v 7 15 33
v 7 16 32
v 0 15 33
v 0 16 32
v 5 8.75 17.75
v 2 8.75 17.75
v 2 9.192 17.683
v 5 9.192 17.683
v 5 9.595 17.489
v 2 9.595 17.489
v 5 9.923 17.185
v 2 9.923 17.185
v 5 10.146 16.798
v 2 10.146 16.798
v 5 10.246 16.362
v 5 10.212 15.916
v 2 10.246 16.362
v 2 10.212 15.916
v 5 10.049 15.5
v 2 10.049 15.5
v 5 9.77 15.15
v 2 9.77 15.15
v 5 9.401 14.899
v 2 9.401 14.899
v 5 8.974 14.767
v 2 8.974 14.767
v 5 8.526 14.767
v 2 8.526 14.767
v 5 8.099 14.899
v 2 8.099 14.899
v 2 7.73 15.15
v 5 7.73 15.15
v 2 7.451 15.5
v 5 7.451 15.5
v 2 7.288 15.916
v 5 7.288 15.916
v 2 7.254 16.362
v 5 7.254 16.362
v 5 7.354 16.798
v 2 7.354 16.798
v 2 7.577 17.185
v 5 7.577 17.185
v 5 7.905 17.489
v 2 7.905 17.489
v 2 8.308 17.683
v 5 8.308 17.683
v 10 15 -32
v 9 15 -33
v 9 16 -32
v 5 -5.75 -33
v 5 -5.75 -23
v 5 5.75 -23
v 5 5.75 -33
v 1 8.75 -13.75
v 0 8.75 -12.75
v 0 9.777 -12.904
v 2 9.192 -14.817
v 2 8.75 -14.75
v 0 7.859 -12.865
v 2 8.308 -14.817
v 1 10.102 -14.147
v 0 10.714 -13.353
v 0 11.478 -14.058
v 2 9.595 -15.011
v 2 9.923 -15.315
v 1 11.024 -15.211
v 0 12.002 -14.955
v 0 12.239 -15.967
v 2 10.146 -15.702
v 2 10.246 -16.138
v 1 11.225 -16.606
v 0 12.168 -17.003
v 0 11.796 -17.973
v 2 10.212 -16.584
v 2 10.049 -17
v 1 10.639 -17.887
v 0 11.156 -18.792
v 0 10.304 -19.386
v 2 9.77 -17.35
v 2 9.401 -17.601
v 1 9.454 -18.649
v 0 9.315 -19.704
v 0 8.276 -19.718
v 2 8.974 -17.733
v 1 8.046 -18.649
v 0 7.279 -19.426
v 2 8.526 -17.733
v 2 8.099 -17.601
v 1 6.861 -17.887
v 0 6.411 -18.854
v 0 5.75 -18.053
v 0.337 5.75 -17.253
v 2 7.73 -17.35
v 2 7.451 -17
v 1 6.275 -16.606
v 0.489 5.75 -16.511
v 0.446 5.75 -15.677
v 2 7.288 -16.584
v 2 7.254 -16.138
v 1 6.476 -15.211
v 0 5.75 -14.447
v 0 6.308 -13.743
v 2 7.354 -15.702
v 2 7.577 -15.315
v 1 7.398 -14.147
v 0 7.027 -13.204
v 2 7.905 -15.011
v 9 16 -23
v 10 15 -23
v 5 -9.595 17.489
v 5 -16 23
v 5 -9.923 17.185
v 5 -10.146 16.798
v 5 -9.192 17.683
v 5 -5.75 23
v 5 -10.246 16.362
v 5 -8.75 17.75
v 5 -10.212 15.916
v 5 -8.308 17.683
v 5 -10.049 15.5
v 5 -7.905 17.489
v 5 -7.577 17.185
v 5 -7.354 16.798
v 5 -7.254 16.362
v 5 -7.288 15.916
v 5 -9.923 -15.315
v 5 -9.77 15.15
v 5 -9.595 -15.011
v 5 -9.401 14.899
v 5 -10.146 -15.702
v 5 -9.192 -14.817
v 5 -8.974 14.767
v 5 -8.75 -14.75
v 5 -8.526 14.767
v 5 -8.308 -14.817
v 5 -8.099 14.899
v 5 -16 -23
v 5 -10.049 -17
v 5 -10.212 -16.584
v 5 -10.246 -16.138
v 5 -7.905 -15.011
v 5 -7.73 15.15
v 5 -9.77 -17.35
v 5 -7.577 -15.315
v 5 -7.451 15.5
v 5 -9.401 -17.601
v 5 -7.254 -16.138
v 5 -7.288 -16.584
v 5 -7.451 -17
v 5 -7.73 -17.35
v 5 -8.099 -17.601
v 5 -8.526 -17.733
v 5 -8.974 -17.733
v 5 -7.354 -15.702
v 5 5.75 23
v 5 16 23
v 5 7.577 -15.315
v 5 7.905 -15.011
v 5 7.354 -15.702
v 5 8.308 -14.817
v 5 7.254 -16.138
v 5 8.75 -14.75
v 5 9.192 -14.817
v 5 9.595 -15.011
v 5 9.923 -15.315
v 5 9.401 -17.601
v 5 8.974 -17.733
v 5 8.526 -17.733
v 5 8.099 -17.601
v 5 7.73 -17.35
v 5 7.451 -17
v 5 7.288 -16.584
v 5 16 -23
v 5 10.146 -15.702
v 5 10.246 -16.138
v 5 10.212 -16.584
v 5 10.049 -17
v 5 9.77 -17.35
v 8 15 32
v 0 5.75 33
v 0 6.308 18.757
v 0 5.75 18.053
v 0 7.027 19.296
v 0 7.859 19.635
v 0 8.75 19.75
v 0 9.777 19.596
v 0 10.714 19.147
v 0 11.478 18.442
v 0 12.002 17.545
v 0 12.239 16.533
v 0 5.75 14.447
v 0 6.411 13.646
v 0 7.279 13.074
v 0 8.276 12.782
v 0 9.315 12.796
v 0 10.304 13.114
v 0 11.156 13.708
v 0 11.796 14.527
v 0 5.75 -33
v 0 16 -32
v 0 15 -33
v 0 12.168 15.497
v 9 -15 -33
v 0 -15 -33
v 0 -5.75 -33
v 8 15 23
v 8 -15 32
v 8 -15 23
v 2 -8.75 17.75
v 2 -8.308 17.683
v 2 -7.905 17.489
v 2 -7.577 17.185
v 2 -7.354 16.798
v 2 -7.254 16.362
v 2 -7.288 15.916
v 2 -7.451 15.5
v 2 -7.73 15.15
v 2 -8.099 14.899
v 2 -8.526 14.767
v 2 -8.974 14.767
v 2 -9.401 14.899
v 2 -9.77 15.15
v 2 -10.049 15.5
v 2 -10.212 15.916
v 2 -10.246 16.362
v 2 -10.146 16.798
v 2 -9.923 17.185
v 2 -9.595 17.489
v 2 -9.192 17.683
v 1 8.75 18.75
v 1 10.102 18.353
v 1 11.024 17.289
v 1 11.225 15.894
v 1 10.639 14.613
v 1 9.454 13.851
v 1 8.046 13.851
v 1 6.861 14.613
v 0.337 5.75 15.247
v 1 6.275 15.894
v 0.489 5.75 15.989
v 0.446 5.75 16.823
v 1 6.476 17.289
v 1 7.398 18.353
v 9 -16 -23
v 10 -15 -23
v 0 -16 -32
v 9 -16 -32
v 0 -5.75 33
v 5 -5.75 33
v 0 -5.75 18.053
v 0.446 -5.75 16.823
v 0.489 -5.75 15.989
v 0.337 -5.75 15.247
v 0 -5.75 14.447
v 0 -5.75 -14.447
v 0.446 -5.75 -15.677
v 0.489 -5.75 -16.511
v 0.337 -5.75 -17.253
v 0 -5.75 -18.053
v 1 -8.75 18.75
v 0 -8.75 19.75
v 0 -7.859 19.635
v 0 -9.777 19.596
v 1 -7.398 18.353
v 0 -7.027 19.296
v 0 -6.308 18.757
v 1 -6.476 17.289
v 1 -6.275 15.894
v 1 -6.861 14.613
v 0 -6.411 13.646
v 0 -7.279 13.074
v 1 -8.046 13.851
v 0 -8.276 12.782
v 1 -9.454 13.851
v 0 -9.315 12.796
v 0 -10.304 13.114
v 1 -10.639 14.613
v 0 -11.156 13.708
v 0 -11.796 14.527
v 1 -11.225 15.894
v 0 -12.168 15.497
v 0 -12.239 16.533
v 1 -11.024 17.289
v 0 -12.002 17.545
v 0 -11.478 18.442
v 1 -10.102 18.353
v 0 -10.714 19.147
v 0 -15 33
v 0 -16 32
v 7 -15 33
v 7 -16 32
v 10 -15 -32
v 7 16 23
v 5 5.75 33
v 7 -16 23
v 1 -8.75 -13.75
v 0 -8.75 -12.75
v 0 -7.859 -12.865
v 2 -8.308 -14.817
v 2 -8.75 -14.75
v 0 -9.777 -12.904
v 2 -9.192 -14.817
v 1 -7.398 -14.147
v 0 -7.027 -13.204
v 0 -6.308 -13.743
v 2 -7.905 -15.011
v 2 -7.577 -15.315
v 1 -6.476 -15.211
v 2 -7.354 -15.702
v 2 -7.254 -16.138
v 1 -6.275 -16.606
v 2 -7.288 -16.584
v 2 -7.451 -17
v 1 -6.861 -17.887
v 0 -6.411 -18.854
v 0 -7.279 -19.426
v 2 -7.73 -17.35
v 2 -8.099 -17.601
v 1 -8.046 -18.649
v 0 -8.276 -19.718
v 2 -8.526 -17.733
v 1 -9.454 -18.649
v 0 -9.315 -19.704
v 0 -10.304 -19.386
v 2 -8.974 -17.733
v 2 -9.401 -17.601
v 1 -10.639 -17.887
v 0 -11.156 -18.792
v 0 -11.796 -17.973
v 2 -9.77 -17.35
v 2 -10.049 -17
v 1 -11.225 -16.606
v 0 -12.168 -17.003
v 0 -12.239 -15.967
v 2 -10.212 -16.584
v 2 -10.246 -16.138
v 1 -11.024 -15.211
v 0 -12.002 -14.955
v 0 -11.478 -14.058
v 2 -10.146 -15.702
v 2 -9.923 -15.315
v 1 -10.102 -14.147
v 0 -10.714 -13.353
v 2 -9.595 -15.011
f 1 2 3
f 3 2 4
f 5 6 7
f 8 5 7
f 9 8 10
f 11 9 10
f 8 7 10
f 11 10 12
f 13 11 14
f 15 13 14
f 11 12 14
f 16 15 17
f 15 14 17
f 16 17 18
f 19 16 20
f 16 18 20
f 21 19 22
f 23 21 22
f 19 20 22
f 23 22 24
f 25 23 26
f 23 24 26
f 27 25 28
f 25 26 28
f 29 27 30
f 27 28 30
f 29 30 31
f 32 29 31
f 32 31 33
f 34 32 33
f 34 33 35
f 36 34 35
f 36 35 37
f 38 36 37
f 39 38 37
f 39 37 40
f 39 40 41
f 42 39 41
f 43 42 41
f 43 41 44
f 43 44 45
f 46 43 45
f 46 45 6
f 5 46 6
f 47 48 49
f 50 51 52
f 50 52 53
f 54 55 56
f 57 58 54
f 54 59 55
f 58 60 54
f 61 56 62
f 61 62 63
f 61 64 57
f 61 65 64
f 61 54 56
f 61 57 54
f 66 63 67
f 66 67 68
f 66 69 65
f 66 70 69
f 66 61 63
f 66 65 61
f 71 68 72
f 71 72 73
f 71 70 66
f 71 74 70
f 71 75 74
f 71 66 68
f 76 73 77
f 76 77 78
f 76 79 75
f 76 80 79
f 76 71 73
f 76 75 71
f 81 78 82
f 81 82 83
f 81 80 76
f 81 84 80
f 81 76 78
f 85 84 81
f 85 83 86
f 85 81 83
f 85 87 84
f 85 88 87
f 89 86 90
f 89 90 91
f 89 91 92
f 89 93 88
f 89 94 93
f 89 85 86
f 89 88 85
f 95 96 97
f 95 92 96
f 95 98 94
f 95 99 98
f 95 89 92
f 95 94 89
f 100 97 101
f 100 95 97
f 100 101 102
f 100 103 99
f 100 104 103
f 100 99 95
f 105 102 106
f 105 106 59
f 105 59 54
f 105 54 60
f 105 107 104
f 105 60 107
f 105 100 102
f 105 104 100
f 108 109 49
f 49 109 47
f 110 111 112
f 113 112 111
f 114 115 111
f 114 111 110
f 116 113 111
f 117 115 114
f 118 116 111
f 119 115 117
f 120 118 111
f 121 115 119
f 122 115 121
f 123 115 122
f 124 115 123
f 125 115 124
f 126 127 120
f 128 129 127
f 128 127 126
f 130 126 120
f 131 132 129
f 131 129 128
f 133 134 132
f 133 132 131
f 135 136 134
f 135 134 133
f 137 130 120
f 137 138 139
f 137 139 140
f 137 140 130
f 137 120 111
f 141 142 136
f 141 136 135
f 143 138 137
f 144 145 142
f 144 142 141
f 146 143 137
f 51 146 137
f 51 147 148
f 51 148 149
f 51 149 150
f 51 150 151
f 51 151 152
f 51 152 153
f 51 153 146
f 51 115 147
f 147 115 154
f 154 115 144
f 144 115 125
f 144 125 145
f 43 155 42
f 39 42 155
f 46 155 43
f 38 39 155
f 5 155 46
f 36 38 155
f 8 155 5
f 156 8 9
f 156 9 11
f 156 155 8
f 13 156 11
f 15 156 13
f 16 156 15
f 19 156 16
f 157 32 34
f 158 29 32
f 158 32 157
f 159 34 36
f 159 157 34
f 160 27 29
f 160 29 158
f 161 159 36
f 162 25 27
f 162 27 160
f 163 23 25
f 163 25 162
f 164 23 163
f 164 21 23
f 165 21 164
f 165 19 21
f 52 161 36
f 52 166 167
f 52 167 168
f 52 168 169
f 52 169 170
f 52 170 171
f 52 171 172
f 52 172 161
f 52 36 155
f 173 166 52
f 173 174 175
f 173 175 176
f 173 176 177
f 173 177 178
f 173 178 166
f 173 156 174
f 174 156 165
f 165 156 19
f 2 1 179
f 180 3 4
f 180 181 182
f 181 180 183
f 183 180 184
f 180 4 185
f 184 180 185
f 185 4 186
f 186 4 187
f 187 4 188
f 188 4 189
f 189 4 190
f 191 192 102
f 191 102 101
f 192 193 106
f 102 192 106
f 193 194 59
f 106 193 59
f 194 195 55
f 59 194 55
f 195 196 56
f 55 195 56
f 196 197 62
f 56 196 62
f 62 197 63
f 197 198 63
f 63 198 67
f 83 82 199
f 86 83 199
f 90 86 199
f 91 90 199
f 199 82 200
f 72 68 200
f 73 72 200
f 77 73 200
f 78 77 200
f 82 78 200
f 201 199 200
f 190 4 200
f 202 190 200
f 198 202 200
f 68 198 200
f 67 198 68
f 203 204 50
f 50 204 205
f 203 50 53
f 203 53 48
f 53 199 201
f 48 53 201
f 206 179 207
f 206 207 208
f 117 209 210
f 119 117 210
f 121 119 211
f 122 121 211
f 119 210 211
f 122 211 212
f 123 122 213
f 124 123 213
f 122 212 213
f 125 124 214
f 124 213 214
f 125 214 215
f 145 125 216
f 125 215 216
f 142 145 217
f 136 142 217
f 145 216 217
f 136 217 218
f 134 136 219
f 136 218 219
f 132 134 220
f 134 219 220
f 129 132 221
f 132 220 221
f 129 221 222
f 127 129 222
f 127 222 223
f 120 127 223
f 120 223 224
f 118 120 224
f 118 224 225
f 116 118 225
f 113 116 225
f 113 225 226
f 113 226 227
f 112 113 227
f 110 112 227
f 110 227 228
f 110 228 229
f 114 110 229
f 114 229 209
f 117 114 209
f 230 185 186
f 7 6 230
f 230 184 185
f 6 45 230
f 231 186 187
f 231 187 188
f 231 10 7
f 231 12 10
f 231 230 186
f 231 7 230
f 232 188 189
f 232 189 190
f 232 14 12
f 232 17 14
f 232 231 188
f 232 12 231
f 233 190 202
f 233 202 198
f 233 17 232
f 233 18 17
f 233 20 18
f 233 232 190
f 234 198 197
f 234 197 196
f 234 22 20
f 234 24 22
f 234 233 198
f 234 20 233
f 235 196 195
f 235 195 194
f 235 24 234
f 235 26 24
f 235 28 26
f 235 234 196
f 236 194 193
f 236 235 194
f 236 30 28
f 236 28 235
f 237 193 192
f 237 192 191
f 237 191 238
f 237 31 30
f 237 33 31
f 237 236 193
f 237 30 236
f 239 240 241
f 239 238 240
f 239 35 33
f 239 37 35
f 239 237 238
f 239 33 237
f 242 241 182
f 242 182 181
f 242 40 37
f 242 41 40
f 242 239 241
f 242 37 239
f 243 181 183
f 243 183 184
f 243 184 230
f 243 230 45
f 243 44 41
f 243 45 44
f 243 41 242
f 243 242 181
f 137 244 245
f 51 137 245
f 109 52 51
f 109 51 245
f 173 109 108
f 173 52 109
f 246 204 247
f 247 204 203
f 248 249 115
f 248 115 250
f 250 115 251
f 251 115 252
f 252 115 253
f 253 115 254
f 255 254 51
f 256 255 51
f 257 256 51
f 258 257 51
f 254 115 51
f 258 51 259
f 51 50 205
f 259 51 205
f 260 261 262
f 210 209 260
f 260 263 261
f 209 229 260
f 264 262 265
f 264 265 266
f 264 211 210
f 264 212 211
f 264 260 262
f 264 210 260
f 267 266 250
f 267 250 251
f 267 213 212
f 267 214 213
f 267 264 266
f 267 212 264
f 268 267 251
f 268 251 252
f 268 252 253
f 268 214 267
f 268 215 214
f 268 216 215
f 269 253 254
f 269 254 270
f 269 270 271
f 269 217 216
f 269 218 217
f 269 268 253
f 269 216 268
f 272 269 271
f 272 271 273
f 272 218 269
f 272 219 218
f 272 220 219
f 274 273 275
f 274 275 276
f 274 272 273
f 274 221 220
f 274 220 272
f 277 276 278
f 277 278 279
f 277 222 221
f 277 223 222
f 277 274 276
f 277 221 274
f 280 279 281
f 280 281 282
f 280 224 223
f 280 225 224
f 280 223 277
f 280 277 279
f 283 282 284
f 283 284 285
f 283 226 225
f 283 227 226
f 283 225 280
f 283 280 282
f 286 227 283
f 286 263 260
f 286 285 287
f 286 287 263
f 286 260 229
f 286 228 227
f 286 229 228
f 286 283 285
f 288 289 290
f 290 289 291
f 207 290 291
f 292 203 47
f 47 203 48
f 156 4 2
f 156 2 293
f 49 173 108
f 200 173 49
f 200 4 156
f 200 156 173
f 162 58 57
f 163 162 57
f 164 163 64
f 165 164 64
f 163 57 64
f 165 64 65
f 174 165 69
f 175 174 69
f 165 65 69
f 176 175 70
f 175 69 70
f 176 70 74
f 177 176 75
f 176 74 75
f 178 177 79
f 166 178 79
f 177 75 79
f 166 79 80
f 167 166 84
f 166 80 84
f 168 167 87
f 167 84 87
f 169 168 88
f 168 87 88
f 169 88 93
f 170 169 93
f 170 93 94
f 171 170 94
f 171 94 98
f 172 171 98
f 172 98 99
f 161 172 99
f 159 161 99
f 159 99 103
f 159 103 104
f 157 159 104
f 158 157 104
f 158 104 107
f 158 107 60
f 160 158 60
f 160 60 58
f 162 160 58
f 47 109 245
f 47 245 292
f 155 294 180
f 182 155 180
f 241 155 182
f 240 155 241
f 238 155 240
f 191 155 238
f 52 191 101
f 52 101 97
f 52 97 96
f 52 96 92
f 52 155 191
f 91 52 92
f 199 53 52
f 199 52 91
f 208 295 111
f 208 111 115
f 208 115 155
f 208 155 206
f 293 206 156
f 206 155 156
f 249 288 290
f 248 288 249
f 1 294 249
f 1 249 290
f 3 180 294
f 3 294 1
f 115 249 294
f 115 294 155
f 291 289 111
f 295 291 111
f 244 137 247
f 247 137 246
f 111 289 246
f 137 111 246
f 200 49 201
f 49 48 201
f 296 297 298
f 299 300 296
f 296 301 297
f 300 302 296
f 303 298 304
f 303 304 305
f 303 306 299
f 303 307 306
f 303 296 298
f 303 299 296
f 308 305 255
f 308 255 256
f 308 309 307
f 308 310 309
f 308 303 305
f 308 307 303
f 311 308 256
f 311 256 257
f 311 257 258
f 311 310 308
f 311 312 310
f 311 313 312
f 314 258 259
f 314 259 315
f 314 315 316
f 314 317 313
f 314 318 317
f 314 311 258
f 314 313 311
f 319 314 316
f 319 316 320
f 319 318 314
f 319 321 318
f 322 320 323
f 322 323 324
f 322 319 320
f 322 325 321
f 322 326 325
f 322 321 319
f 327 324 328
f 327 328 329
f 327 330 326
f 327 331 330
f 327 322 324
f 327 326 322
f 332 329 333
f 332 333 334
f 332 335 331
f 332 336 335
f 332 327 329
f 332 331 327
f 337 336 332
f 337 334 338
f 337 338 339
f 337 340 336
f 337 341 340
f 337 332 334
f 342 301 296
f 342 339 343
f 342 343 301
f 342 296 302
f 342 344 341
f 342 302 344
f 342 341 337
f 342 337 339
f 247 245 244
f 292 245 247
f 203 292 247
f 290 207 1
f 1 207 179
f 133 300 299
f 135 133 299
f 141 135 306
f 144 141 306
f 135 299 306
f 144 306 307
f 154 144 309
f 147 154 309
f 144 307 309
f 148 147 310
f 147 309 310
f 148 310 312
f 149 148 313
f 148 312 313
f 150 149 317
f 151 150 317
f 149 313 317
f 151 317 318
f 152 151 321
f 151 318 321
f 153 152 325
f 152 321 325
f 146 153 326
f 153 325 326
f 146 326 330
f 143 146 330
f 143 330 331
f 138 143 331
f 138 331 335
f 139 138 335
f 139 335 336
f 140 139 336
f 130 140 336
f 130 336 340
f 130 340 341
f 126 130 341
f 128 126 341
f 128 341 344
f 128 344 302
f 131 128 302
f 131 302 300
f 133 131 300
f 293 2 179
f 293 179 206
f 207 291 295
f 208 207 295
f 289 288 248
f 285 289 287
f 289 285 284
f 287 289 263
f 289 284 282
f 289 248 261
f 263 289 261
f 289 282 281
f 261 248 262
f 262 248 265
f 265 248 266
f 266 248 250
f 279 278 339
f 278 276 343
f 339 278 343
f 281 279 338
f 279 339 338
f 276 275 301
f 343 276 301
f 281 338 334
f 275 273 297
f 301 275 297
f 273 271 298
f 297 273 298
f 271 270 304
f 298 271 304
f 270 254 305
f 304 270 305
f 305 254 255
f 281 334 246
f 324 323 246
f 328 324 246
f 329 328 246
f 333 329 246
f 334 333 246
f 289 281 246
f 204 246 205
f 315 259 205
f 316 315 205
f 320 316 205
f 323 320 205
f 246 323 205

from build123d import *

# Parameters (mm, degrees)
SKETCH_2_W          = 66
SKETCH_2_H          = 32
EXTRUDE_1_DEPTH     = 5
SKETCH_3_W          = 46
SKETCH_3_H          = 11.5
CUT_EXTRUDE_2_DEPTH = 38.013511047
SKETCH_4_W          = 5
SKETCH_4_H          = 11.5
CUT_EXTRUDE_3_DEPTH = 69.095521145
SKETCH_5_W          = 10
SKETCH_5_H          = 32
EXTRUDE_2_DEPTH     = 5
SKETCH_6_W          = 10
SKETCH_6_H          = 32
EXTRUDE_3_DEPTH     = 3
SKETCH_7_R          = 1.5
CUT_EXTRUDE_4_DEPTH = 39.013155617
CHAMFER_1_SIZE      = 2
CHAMFER_2_SIZE      = 1


with BuildPart() as part:
    # 草图2 → 凸台-拉伸1 (new body)
    with BuildSketch(Plane(origin=(0, 0, 0), x_dir=(0, 0, -1), z_dir=(1, 0, 0))):
        Rectangle(SKETCH_2_W, SKETCH_2_H)
    extrude(amount=EXTRUDE_1_DEPTH)

    # 草图3 → 切除-拉伸2 (cut, through all)
    with BuildSketch(Plane.ZY):
        Rectangle(SKETCH_3_W, SKETCH_3_H)
    extrude(amount=-CUT_EXTRUDE_2_DEPTH, mode=Mode.SUBTRACT)

    # 草图4 → 切除-拉伸3 (cut, through all)
    with BuildSketch(Plane(origin=(0, 0, -33), x_dir=(-1, 0, 0), z_dir=(0, 0, -1))):
        with Locations((-2.5, 0)):
            Rectangle(SKETCH_4_W, SKETCH_4_H)
    extrude(amount=-CUT_EXTRUDE_3_DEPTH, mode=Mode.SUBTRACT)


with BuildPart() as cut_extrude_3_piece_1:
    # of the separate pieces the step leaves, piece 1, a body of its own (cut_extrude_3_pieces)
    add(part.part.solids().sort_by_distance((0, -16, -33))[0])



with BuildPart() as cut_extrude_3_piece_2:
    # of the separate pieces the step leaves, piece 2, a body of its own (cut_extrude_3_pieces)
    add(part.part.solids().sort_by_distance((0, 16, -33))[0])


with BuildPart() as cut_extrude_3_piece_1_1:
    add(cut_extrude_3_piece_1.part)

    add(cut_extrude_3_piece_2.part)  # 凸台-拉伸2 merges 切除-拉伸3 piece 2
    # 草图5 → 凸台-拉伸2 (add)
    with BuildSketch(Plane(origin=(5, 0, 0), x_dir=(0, 0, -1), z_dir=(1, 0, 0))):
        with Locations((28, 0)):
            Rectangle(SKETCH_5_W, SKETCH_5_H)
    extrude(amount=EXTRUDE_2_DEPTH)

    # 草图6 → 凸台-拉伸3 (add)
    with BuildSketch(Plane(origin=(5, 0, 0), x_dir=(0, 0, -1), z_dir=(1, 0, 0))):
        with Locations((-28, 0)):
            Rectangle(SKETCH_6_W, SKETCH_6_H)
    extrude(amount=EXTRUDE_3_DEPTH)

    # 草图7 → 切除-拉伸4 (cut, through all)
    with BuildSketch(Plane.ZY):
        with Locations((-16.25, 8.75)):
            Circle(SKETCH_7_R)
        with Locations((16.25, 8.75)):
            Circle(SKETCH_7_R)
        with Locations((16.25, -8.75)):
            Circle(SKETCH_7_R)
        with Locations((-16.25, -8.75)):
            Circle(SKETCH_7_R)
    extrude(amount=-CUT_EXTRUDE_4_DEPTH, mode=Mode.SUBTRACT)

    # 倒角1
    # the kernel refuses this chamfer: 2 mm, written as the material it takes off along each edge
    with BuildSketch(Plane(origin=(0, -8.75, -16.25), x_dir=(0, 0, 1), z_dir=(0, -1, 0))) as chamfer_1_piece_1:
        Polygon((1.5 + CHAMFER_1_SIZE, 0), (1.5, -CHAMFER_1_SIZE), (1.5, 0), align=None)
    revolve(axis=Axis((0, -8.75, -16.25), (-1, 0, 0)), mode=Mode.SUBTRACT)
    with BuildSketch(Plane(origin=(0, -8.75, 16.25), x_dir=(0, 0, 1), z_dir=(0, -1, 0))) as chamfer_1_piece_2:
        Polygon((1.5 + CHAMFER_1_SIZE, 0), (1.5, -CHAMFER_1_SIZE), (1.5, 0), align=None)
    revolve(axis=Axis((0, -8.75, 16.25), (-1, 0, 0)), mode=Mode.SUBTRACT)
    with BuildSketch(Plane(origin=(0, 8.75, 16.25), x_dir=(0, 0, 1), z_dir=(0, -1, 0))) as chamfer_1_piece_3:
        Polygon((1.5 + CHAMFER_1_SIZE, 0), (1.5, -CHAMFER_1_SIZE), (1.5, 0), align=None)
    revolve(axis=Axis((0, 8.75, 16.25), (-1, 0, 0)), mode=Mode.SUBTRACT)
    with BuildSketch(Plane(origin=(0, 8.75, -16.25), x_dir=(0, 0, 1), z_dir=(0, -1, 0))) as chamfer_1_piece_4:
        Polygon((1.5 + CHAMFER_1_SIZE, 0), (1.5, -CHAMFER_1_SIZE), (1.5, 0), align=None)
    revolve(axis=Axis((0, 8.75, -16.25), (-1, 0, 0)), mode=Mode.SUBTRACT)

    # 倒角2
    chamfer_2_edges = [cut_extrude_3_piece_1_1.edges().sort_by_distance(p)[0] for p in [
        (5, 16, -33),
        (10, -16, -28),
        (10, 0, -33),
        (10, 16, -28),
        (4, 16, 33),
        (5, -16, -33),
        (4, -16, 33),
        (8, 0, 33),
        (8, -16, 28),
        (8, 16, 28),
    ]]
    chamfer(chamfer_2_edges, length=CHAMFER_2_SIZE)


solid = cut_extrude_3_piece_1_1.part
